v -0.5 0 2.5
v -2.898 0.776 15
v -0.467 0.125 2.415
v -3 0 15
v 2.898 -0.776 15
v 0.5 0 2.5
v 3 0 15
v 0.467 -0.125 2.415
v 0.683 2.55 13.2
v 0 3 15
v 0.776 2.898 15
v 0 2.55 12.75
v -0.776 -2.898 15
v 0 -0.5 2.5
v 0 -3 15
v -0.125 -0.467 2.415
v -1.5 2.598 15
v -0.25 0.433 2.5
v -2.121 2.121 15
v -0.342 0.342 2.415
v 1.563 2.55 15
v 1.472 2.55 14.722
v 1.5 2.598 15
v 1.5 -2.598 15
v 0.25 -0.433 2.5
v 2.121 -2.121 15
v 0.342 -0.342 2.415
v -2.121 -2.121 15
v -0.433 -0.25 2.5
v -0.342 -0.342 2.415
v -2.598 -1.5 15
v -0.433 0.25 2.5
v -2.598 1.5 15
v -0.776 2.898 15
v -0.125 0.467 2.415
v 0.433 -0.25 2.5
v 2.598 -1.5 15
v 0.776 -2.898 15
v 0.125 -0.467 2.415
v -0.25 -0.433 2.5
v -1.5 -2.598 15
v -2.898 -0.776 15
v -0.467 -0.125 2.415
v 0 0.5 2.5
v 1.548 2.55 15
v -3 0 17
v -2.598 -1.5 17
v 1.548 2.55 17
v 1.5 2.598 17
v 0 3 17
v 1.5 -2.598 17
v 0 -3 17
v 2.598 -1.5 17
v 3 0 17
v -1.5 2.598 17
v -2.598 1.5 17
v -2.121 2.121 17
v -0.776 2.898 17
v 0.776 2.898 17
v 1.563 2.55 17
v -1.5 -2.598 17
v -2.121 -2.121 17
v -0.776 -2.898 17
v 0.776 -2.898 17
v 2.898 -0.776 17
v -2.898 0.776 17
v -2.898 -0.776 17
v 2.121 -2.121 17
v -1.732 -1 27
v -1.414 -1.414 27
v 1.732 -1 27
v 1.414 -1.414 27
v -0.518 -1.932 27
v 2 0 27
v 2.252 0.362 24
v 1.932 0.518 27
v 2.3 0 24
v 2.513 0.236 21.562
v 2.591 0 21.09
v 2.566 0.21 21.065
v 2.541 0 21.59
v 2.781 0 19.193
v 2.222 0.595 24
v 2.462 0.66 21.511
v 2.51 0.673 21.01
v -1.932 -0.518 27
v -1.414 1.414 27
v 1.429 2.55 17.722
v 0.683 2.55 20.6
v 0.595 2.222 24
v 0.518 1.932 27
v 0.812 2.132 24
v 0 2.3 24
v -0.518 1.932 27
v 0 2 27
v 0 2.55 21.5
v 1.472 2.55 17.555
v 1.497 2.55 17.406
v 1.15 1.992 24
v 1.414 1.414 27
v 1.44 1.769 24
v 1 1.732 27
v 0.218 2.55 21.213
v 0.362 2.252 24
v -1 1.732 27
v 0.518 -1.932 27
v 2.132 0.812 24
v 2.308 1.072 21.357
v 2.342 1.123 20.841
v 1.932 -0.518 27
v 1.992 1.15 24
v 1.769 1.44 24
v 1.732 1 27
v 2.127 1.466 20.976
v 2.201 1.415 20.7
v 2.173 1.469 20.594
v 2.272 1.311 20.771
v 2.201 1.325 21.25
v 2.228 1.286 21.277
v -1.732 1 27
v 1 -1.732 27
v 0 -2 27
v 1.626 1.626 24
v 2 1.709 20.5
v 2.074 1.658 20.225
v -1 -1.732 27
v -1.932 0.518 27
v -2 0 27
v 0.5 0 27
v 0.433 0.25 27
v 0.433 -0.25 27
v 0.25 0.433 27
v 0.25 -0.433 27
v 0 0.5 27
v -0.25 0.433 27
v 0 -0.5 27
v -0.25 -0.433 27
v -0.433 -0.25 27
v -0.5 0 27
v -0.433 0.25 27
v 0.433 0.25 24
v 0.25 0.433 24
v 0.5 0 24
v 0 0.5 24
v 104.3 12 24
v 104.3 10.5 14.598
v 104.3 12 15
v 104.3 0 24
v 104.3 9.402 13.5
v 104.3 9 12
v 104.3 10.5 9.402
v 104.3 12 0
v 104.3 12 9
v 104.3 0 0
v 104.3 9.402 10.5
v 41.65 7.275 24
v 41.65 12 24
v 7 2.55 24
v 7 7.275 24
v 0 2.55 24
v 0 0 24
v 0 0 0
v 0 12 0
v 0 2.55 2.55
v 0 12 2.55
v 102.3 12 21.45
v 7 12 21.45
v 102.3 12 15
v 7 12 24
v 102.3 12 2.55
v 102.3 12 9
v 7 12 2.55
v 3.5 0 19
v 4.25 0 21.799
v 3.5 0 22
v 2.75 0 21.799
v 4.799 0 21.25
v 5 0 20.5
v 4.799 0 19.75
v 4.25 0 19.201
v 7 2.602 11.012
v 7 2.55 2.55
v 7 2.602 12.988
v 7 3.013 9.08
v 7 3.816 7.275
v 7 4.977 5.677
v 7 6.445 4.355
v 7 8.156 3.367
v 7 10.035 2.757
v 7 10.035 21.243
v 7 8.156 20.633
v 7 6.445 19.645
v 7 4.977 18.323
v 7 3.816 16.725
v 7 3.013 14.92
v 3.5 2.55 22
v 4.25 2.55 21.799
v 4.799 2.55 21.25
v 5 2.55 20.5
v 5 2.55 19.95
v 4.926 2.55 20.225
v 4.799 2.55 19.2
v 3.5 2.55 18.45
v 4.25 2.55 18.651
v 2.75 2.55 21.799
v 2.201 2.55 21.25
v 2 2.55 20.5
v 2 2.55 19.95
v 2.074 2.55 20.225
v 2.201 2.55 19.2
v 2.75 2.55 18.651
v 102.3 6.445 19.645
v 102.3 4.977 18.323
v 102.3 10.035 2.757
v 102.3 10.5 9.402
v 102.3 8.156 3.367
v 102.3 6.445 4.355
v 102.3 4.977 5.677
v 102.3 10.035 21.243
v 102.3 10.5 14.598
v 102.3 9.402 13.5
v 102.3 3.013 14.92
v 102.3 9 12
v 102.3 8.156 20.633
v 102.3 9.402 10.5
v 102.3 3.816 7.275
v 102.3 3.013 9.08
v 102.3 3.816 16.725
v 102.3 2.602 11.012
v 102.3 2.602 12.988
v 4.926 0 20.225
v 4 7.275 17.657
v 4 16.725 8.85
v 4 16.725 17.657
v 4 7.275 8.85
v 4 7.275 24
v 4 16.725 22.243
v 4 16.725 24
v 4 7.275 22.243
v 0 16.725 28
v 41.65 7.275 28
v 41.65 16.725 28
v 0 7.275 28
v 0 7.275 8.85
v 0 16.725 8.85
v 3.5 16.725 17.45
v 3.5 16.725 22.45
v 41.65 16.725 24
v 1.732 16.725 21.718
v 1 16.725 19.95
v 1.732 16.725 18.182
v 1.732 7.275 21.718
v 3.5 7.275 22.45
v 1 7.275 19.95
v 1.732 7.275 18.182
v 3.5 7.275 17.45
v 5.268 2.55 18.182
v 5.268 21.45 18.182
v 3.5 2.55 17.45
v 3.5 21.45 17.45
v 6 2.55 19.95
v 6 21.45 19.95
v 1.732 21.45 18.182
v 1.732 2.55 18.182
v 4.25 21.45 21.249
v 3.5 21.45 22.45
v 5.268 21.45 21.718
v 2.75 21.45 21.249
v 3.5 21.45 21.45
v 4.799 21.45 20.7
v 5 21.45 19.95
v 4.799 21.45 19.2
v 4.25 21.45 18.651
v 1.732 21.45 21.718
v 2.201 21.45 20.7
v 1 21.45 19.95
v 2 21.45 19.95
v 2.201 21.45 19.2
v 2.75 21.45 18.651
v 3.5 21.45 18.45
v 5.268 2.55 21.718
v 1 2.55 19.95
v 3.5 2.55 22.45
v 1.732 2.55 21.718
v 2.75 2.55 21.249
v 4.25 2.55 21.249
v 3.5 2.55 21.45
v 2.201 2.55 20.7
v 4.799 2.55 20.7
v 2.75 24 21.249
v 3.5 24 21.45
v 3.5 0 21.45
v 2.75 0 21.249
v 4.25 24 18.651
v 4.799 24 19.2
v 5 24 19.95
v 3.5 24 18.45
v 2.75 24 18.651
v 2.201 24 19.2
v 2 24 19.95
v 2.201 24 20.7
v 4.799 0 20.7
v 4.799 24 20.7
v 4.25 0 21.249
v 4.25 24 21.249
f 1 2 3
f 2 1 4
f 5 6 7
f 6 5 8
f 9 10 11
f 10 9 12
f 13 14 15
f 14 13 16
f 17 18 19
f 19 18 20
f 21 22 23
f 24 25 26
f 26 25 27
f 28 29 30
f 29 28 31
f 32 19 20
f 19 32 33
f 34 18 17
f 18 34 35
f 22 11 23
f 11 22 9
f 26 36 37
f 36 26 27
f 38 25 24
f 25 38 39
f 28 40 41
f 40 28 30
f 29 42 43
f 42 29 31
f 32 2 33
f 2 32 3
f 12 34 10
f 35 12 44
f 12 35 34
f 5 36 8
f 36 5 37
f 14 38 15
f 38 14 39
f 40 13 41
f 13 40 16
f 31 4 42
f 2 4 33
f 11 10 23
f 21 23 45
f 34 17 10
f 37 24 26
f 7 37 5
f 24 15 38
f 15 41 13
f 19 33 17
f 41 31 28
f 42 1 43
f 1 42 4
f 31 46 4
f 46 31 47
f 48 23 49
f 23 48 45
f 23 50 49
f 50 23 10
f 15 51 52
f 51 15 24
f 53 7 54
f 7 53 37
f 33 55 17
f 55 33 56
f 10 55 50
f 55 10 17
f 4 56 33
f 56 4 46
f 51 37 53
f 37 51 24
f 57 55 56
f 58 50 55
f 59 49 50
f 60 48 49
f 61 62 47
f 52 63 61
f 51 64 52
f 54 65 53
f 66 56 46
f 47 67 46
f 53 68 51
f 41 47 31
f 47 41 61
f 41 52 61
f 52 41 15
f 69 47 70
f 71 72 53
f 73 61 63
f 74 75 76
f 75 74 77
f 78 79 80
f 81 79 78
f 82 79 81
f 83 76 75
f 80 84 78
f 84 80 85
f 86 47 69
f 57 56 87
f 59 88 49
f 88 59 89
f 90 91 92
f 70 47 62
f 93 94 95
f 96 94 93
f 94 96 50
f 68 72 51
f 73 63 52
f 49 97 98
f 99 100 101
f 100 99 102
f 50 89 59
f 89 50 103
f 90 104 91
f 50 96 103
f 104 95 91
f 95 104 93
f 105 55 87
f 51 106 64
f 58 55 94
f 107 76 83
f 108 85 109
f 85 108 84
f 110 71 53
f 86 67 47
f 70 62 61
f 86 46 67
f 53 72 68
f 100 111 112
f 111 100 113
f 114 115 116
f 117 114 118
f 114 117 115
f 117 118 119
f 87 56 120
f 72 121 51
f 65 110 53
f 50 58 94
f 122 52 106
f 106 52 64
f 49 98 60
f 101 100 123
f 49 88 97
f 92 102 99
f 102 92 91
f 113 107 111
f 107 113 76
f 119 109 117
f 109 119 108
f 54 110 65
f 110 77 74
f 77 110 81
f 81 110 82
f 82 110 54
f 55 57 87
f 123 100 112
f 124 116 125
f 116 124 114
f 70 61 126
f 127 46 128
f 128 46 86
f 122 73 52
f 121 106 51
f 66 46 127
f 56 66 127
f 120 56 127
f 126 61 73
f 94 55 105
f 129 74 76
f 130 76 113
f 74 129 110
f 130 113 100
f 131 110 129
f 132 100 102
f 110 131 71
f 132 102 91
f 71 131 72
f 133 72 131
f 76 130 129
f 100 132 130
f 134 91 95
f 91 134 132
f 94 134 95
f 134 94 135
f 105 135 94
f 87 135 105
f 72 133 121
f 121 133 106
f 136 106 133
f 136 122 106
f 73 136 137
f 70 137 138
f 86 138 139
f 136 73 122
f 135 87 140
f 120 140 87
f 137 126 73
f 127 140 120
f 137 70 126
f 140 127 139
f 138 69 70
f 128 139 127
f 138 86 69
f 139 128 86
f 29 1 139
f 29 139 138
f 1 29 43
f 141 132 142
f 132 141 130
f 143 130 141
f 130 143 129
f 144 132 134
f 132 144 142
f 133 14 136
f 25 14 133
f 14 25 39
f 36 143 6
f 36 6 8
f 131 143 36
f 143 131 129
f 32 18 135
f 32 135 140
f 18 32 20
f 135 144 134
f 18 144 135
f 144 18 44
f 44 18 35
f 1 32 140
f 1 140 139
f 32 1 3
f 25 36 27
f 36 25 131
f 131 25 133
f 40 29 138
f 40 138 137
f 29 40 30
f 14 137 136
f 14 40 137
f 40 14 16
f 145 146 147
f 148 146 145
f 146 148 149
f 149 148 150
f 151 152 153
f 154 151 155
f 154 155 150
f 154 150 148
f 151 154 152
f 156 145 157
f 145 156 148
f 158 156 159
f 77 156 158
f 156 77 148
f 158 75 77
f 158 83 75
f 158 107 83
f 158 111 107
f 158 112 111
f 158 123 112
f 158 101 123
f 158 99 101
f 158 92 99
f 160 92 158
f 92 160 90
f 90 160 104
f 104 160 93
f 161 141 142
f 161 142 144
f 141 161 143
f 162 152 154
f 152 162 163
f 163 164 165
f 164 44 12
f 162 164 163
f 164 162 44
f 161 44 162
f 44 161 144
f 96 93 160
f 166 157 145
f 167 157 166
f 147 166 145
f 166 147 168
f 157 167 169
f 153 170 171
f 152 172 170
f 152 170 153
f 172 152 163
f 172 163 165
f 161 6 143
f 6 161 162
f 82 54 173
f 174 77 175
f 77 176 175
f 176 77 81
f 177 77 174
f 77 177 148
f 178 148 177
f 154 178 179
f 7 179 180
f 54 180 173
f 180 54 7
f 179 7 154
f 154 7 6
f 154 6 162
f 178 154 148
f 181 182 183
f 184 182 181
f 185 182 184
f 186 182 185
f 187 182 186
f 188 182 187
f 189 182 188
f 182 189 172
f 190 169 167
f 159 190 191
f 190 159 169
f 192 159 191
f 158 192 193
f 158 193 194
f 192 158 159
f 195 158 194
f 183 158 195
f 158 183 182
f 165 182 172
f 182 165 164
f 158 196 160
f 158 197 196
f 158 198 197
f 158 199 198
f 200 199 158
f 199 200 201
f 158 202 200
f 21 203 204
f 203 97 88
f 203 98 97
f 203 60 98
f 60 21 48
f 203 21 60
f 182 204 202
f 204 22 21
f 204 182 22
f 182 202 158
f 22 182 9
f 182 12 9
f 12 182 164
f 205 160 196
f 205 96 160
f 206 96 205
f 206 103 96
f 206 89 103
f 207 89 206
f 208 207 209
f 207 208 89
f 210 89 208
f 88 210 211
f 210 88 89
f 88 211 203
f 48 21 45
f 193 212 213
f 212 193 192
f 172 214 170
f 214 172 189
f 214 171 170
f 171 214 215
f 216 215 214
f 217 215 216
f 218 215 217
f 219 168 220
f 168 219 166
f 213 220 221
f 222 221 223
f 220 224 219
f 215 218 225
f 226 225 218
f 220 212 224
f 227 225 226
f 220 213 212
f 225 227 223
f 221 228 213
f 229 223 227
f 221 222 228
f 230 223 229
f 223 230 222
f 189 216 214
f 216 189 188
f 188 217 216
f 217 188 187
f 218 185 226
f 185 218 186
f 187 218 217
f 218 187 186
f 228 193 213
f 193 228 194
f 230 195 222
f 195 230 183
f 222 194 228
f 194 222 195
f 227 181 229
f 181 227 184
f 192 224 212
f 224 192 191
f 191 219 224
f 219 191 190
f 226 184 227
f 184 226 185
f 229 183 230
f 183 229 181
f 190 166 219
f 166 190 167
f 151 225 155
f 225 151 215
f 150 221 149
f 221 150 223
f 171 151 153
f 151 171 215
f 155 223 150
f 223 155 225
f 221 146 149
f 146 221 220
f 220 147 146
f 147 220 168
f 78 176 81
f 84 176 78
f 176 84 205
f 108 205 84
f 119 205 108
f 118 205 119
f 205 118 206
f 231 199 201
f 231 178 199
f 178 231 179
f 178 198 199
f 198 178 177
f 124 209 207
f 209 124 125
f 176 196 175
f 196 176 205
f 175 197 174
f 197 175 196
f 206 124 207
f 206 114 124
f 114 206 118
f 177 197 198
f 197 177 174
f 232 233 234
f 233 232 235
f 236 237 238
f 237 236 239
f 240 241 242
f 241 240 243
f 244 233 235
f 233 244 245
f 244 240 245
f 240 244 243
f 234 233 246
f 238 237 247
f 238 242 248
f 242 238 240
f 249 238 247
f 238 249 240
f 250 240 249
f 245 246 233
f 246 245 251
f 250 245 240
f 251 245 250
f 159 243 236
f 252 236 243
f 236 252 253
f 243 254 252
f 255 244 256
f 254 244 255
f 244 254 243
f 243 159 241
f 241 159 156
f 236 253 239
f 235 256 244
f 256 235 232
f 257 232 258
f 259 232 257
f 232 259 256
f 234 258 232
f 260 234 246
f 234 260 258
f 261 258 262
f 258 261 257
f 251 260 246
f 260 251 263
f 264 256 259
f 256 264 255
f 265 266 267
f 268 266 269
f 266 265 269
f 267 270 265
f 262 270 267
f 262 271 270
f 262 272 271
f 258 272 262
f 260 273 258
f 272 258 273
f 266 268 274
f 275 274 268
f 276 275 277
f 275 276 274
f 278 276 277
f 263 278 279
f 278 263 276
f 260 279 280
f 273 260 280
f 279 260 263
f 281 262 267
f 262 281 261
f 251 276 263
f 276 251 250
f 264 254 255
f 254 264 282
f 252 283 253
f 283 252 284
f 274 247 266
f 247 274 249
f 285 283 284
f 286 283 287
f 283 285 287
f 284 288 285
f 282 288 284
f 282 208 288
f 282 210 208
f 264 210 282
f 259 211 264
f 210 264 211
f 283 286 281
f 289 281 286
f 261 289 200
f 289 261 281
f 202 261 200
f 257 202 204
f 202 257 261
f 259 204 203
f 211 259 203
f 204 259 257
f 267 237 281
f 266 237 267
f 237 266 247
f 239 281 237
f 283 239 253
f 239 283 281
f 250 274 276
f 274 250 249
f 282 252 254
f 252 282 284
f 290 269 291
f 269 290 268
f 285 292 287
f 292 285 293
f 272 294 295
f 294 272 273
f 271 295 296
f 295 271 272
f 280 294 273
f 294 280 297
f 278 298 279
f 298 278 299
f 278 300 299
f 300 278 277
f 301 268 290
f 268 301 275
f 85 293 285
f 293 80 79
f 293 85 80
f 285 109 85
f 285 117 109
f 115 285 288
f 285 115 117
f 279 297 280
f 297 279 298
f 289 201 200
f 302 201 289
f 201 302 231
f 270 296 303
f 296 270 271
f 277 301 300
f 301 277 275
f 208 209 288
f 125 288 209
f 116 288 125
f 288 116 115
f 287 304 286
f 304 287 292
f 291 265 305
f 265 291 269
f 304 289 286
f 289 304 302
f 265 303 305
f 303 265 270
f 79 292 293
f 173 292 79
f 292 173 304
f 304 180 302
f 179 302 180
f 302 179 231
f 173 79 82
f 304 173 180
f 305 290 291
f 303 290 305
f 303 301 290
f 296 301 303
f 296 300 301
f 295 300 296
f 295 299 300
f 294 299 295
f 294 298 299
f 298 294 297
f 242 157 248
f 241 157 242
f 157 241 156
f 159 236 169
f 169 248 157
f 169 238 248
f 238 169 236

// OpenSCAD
casing_width = 24;
cartridge_width = 18.9;
cartridge_length = 83.3;
pin_needle_length = 15;
lever_foot_thickness = 4;
pin_middle_thickness = 6;

module pin() {
	difference () {
		union() {
			cylinder(h=15, r1=0, r2=3, $fn=24);
			translate([0, 0, 15]) cylinder(h=2, r=pin_middle_thickness / 2, $fn=12);
			translate([0, 0, 17]) cylinder(h=10, r1=3, r2=2, $fn=24);
		}
		cylinder(h=30, r=.5, $fn=12);
	}
}
pin();
/*
difference() {
	//cube([95, 23, 23]);
	#translate([-2, 23/2, 23/2]) rotate(90, [0, 1, 0]) cylinder(r=18.25/2, h=85);
	#translate([82, 23/2, 23/2]) rotate(90, [0, 1, 0]) cylinder(r=3.5, h=20);
	
}*/



module nozzle() {
	difference () {
	union () {
		cylinder(r=6.8/2, h=8);
		translate([0, 0, 8 - 3]) cylinder(r=7.8/2, h=3);
		translate([-6.10/2, 0, 8 - 1.62]) cube([6.10, 8, 1.62]);
	}
	translate([0, 0, -1]) cylinder(r=4.33/2, h=10);
	}
}

//nozzle();
//rotate(180, [1, 0, 0]) pin();

module cartridge() {
	cylinder(r=cartridge_width/2,h=cartridge_length);
}

//cartridge();

module casing_half() {
	union() {
		difference() {
			cube([2 + lever_foot_thickness + pin_needle_length + cartridge_length, casing_width / 2, casing_width]);
			translate([-1, (casing_width - cartridge_width) / 2, (casing_width - cartridge_width) / 2]) cube([lever_foot_thickness * 2, cartridge_width, casing_width]);
			translate([lever_foot_thickness, casing_width / 2, casing_width / 2]) rotate(90, [0, 1, 0]) cylinder(r=cartridge_width/2,h=(cartridge_length + pin_needle_length));
			translate([lever_foot_thickness + cartridge_length + pin_needle_length - 1, casing_width / 2, casing_width / 2]) rotate(90, [0, 1, 0]) cylinder(r=(pin_middle_thickness / 2), h=4, $fn=12);
			translate([2+1.5, -1, casing_width - 2 - 1.5]) rotate(-90, [1, 0, 0]) cylinder(r=1.5, h=10, $fn=12);
		}
	}
}

//mirror([0, 1, 0])
casing_half();

module lever() {
	union() {
		cube([lever_foot_thickness, 	cartridge_width / 2, 2/3 * cartridge_width + (casing_width - cartridge_width) / 2 + lever_foot_thickness]);
		translate([1.5 + 2, -(cartridge_width / 4), 2/3 * cartridge_width - 1.5]) rotate(-90, [1, 0, 0]) cylinder(r=5/2, h=cartridge_width);
		translate([1.5 + 2, - (casing_width - (cartridge_width / 2)) / 2, 2/3 * cartridge_width - 1.5]) rotate(-90, [1, 0, 0]) cylinder(r=1.5, h=casing_width, $fn=12);
		translate([0, 0, 2/3 * cartridge_width + (casing_width - cartridge_width) / 2]) cube([cartridge_length/2, cartridge_width / 2, lever_foot_thickness]);
	}
}

translate([0, (casing_width - (cartridge_width / 2)) / 2, (casing_width - cartridge_width) / 2 + 1/3 * cartridge_width]) 

lever();
